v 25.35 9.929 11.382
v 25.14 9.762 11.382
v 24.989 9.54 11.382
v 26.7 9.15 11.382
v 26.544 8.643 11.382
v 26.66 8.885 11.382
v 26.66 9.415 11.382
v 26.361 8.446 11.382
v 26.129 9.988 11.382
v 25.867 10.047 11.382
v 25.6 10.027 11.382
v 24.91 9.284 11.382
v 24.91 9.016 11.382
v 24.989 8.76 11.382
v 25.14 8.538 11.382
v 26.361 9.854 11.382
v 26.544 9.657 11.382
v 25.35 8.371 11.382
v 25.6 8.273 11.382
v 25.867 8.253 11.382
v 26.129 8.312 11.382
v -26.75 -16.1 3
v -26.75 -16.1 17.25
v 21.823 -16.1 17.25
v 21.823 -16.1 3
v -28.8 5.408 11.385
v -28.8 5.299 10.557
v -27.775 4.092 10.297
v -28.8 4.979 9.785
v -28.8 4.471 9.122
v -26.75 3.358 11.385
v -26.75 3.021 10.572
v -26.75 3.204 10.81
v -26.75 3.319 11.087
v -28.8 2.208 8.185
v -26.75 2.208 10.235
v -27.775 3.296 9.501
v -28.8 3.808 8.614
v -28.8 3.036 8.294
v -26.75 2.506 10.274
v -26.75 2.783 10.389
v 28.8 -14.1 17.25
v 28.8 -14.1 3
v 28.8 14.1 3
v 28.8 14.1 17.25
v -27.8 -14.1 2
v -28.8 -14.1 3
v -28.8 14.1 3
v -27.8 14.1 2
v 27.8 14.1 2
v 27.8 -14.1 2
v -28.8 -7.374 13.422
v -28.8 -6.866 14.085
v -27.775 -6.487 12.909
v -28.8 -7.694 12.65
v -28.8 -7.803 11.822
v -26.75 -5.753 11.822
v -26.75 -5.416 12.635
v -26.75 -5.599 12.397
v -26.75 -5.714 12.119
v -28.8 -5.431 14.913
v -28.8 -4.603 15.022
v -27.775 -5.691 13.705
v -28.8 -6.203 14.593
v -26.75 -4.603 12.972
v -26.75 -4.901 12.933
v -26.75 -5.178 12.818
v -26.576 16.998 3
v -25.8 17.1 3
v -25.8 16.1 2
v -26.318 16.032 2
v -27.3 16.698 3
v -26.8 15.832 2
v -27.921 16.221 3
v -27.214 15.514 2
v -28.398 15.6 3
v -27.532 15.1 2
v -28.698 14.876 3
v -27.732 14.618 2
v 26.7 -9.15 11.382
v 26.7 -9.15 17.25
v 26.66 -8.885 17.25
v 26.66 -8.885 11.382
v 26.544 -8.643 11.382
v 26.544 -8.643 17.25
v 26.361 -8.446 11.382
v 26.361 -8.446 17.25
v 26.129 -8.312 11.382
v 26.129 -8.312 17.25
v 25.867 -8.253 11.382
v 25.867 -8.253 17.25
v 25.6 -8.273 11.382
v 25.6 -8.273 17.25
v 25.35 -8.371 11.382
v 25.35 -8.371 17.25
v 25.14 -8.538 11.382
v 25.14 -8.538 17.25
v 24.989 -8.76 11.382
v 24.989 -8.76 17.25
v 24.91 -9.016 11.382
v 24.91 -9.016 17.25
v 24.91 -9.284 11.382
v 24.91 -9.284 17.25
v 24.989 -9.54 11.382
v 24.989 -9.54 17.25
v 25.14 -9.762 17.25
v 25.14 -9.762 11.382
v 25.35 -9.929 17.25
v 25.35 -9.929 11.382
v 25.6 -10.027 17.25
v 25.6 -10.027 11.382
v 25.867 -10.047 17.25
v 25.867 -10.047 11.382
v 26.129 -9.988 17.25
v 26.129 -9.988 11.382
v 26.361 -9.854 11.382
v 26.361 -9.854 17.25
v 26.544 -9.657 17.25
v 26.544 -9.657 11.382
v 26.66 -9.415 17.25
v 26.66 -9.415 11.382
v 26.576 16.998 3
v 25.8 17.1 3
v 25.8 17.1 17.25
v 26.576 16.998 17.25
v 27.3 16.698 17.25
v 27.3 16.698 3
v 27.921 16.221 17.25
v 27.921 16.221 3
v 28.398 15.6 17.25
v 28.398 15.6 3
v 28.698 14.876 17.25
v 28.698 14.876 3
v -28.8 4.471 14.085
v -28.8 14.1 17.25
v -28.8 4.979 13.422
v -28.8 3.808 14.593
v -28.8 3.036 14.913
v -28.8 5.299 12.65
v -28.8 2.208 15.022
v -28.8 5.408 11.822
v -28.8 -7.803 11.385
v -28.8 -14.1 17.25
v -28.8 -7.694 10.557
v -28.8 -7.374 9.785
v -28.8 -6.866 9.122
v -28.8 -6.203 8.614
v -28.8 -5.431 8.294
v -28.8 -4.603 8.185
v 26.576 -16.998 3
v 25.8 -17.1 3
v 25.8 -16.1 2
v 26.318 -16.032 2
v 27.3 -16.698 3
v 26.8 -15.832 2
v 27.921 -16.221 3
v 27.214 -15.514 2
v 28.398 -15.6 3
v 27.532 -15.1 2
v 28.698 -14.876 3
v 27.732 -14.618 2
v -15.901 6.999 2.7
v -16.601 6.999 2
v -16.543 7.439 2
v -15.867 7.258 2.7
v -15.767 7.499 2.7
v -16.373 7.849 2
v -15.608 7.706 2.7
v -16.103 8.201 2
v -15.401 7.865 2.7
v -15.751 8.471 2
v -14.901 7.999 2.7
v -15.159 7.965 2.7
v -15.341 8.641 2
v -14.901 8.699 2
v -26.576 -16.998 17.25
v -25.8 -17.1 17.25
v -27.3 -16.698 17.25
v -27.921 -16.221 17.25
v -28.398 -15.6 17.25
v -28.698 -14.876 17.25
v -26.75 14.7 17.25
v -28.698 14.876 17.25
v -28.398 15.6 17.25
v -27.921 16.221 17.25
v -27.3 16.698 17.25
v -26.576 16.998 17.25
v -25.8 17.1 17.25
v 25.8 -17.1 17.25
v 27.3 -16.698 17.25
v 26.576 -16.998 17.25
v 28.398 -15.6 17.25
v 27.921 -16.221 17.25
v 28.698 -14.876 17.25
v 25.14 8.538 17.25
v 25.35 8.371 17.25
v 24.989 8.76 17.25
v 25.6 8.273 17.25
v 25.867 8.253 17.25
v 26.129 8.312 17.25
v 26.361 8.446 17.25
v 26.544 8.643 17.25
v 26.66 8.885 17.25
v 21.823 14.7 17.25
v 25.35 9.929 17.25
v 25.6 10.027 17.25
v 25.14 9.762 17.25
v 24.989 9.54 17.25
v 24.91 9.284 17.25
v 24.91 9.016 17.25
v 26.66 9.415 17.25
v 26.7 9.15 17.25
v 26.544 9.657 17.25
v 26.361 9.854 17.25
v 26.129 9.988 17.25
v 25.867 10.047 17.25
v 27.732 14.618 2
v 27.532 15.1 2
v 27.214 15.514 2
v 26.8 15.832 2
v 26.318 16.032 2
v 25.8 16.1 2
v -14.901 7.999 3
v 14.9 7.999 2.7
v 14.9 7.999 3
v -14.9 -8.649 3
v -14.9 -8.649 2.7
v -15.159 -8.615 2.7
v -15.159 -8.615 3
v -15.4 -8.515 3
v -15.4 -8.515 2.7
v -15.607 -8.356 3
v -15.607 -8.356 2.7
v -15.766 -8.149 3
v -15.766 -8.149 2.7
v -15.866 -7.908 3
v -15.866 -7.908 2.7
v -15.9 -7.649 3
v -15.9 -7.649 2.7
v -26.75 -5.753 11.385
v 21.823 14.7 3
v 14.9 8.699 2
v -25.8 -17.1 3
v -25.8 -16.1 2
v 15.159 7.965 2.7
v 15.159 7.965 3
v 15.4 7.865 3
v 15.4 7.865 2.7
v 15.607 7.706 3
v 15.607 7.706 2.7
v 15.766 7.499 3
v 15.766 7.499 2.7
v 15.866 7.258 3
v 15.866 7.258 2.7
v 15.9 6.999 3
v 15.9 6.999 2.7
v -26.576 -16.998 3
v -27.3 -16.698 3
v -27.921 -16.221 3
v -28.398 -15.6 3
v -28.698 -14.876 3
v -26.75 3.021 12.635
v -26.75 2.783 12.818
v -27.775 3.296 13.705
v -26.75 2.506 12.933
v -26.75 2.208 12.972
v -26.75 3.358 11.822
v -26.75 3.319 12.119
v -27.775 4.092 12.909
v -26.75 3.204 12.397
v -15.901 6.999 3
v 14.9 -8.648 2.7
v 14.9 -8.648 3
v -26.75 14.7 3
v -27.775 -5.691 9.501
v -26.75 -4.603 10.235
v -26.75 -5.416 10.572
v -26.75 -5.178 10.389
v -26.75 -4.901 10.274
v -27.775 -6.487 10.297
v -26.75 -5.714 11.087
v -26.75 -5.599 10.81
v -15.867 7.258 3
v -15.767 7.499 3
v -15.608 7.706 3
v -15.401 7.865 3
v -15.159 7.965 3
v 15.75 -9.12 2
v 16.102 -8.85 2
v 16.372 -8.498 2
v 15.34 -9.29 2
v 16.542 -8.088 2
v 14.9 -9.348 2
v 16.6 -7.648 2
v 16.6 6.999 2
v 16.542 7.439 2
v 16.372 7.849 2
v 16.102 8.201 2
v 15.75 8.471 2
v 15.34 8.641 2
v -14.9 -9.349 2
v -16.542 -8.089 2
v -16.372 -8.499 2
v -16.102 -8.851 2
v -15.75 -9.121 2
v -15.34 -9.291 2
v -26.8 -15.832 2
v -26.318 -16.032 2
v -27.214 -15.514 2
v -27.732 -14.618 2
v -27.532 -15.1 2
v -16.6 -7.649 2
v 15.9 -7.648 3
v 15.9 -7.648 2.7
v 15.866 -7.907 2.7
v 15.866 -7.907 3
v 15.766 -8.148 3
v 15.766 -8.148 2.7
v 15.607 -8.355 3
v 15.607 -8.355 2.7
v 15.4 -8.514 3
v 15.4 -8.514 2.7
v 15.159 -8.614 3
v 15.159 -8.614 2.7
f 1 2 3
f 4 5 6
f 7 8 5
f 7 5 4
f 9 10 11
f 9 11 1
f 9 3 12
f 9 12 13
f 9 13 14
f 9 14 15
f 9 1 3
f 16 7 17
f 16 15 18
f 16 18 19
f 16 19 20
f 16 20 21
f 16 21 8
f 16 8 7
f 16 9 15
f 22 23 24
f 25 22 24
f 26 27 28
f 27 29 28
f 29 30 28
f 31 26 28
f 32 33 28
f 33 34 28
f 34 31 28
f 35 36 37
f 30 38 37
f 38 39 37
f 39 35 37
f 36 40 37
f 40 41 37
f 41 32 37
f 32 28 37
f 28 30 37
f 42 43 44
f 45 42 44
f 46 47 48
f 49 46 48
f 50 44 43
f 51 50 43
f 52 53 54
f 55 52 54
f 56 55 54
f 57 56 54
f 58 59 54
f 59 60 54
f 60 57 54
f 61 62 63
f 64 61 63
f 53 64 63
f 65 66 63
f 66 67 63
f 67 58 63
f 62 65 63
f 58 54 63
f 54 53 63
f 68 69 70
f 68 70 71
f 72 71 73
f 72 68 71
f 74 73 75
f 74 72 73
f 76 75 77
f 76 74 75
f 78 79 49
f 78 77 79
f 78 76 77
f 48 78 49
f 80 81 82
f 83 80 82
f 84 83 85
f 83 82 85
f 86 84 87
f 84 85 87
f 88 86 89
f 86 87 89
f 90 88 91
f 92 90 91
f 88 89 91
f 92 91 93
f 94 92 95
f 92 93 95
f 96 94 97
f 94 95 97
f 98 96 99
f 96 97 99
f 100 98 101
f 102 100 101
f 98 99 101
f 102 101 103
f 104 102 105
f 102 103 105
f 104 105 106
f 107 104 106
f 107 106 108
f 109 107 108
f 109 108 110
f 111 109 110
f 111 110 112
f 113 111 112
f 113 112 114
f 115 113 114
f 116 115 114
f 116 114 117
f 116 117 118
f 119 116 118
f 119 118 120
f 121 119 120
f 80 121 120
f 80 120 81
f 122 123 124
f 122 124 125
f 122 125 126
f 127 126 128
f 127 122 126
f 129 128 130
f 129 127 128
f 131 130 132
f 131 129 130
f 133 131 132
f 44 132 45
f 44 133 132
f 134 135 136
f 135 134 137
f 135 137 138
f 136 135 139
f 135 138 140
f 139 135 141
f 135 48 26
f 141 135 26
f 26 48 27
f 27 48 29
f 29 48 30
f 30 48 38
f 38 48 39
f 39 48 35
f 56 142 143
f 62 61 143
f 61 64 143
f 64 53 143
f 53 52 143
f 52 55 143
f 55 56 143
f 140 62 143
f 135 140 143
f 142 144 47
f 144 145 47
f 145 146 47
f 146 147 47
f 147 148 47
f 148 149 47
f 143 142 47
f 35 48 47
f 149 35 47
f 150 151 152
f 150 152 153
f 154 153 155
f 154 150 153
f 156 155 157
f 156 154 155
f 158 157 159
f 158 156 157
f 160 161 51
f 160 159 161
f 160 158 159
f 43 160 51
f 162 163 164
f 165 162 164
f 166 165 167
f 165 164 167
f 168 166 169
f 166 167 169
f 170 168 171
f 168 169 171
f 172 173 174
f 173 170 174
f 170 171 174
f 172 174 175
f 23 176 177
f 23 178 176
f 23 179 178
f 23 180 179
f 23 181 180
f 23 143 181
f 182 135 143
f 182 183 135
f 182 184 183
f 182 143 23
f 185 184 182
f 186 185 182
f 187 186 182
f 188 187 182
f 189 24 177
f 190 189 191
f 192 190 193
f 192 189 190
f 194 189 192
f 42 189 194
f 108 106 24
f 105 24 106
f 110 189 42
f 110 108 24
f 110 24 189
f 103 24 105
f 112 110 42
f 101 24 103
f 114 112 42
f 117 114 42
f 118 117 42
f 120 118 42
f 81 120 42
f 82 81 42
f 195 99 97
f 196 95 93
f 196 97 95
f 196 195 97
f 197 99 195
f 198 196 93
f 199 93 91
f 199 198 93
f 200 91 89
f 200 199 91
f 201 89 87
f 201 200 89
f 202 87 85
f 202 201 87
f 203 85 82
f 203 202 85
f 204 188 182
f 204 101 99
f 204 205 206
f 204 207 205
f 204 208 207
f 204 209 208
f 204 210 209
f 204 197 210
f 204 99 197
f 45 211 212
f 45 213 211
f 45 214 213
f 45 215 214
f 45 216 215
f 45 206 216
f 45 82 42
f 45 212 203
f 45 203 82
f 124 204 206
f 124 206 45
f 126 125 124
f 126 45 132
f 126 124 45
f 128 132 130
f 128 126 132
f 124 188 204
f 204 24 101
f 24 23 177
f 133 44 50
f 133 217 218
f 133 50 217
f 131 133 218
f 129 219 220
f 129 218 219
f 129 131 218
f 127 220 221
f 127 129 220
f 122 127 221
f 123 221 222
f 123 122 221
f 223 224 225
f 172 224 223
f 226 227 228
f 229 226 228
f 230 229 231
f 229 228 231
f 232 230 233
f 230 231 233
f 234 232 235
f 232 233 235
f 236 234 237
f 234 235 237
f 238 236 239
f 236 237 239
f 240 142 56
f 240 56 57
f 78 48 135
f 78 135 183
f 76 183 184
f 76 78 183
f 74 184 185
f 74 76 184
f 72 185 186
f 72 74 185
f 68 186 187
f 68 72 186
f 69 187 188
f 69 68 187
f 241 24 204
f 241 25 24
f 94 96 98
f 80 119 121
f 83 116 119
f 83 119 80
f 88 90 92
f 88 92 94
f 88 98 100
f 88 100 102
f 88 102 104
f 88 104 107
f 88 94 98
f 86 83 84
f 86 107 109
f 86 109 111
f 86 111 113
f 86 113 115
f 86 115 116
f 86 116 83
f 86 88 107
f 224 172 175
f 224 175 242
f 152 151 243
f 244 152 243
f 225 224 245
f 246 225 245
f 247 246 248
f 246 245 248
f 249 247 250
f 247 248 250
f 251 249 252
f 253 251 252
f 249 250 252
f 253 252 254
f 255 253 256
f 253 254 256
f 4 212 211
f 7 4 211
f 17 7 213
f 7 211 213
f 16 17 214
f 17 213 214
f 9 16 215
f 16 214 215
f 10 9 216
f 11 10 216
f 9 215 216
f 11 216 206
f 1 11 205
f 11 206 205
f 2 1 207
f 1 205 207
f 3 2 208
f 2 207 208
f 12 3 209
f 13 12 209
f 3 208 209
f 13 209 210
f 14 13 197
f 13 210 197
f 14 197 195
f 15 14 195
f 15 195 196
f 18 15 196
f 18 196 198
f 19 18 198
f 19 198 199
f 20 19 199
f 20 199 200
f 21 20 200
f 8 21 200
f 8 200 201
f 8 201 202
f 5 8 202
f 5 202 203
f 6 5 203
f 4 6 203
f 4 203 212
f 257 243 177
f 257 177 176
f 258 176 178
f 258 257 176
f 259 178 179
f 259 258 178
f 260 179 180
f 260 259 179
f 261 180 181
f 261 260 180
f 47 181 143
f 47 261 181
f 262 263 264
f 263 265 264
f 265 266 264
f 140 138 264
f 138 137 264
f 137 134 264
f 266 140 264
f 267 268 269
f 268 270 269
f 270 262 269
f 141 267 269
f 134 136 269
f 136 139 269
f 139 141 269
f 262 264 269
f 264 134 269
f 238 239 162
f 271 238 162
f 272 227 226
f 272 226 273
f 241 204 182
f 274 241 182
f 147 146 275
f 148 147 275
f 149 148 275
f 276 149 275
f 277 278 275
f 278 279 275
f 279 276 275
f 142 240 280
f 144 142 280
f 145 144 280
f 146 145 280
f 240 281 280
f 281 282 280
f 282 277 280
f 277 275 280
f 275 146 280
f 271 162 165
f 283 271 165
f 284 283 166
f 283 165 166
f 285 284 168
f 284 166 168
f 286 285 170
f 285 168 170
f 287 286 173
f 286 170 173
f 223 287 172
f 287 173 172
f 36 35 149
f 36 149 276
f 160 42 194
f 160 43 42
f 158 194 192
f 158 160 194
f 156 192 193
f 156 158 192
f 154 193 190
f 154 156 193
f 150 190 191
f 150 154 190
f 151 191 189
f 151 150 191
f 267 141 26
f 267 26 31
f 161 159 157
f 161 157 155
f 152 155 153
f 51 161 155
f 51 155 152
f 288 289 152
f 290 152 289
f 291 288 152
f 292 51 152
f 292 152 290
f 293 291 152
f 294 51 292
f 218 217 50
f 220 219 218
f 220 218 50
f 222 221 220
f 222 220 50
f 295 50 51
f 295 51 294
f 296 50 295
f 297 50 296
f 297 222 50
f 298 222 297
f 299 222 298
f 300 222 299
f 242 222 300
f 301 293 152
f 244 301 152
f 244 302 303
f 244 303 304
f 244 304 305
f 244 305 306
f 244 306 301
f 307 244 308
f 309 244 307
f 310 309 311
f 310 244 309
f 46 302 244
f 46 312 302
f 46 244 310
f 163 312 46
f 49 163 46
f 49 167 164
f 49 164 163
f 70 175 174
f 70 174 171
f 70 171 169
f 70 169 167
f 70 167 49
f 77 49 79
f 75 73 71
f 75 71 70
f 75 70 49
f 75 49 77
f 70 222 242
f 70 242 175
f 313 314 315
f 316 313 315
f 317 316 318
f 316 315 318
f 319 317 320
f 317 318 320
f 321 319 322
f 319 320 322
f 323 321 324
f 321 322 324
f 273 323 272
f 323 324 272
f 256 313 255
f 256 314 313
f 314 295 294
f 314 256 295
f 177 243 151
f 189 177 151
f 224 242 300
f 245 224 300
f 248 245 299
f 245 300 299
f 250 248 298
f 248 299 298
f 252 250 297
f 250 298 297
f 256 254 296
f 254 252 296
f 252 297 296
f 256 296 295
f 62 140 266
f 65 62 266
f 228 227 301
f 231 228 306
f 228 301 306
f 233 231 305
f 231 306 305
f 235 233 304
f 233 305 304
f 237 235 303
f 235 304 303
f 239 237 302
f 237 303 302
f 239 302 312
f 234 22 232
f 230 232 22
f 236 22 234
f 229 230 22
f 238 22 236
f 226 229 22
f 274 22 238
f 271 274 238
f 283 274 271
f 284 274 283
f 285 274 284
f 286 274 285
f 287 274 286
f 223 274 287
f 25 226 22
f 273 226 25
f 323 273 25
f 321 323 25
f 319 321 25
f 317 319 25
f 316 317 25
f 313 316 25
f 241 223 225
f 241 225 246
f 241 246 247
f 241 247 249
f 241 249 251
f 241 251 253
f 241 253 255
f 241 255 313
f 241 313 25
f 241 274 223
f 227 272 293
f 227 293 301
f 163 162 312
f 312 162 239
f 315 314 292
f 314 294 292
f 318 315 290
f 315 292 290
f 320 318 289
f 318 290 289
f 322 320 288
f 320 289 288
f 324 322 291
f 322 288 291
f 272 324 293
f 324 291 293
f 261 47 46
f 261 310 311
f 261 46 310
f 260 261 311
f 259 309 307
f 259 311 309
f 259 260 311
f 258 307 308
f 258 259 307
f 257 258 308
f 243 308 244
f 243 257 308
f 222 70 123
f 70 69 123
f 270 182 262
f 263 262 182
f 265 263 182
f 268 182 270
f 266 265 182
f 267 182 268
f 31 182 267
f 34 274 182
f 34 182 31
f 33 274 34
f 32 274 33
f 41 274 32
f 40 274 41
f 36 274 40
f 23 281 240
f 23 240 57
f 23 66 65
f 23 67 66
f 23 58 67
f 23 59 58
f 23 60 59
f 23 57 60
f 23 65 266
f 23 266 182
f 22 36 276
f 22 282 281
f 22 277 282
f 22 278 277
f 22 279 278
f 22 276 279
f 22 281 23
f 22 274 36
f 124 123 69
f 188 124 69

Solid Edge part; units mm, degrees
sketch "Sketch1" plane through (0, 0, 0) normal (0, 0, 1) x (1, 0, 0)
  line L0 (-26.75, -15.6) -> (26.75, -15.6)
  line L1 (26.75, -15.6) -> (26.75, 15.6)
  line L2 (26.75, 15.6) -> (-26.75, 15.6)
  line L3 (-26.75, 15.6) -> (-26.75, -15.6)
extrude "Protrusion1" add sketch "Sketch1" along normal blind 3
sketch "Sketch2" plane through (0, 0, 0) normal (0, 0, 1) x (1, 0, 0)
  line L0 (-26.75, -15.6) -> (26.75, -15.6)
  line L1 (26.75, -15.6) -> (26.75, 15.6)
  line L2 (26.75, 15.6) -> (-26.75, 15.6)
  line L3 (-26.75, 15.6) -> (-26.75, -15.6)
  line L4 (-25.8, -17.1) -> (25.8, -17.1)
  arc A0 (28.8, -14.1) -> (25.8, -17.1) centre (25.8, -14.1) cw
  line L5 (28.8, -14.1) -> (28.8, 14.1)
  arc A1 (25.8, 17.1) -> (28.8, 14.1) centre (25.8, 14.1) cw
  line L6 (25.8, 17.1) -> (-25.8, 17.1)
  arc A2 (-28.8, 14.1) -> (-25.8, 17.1) centre (-25.8, 14.1) cw
  line L7 (-28.8, 14.1) -> (-28.8, -14.1)
  arc A3 (-28.8, -14.1) -> (-25.8, -17.1) centre (-25.8, -14.1) ccw
extrude "Wyciągnięcie_2" add sketch "Sketch2" along normal blind 15
chamfer "Faza_4" distance 1 angle 45 8 edges at (28.8, 0, 0) (27.9213, 16.2213, 0) (0, 17.1, 0) (-27.9213, 16.2213, 0) (-28.8, 0, 0) (-27.9213, -16.2213, 0) (0, -17.1, 0) (27.9213, -16.2213, 0)
sketch "Sketch3" plane through (0, 0, 3) normal (0, 0, 1) x (1, 0, 0)
  line L0 (26.75, 15.6) -> (22.07, 15.6)
  line L1 (22.07, 15.6) -> (22.07, -15.6)
  line L2 (22.07, -15.6) -> (26.75, -15.6)
  line L3 (26.75, -15.6) -> (26.75, 15.6)
extrude "Wycięcie_2" add sketch "Sketch3" along normal blind 12
sketch "Sketch4" plane through (-28.8, 0, 8) normal (-1, 0, 0) x (0, -1, 0)
  line L0 (-2.208, 2.2848) -> (4.6031, 2.2848)
  arc A0 (5.7031, 3.3848) -> (4.6031, 2.2848) centre (4.6031, 3.3848) cw
  line L1 (5.7031, 3.3848) -> (5.7031, 3.8218)
  arc A1 (4.6031, 4.9218) -> (5.7031, 3.8218) centre (4.6031, 3.8218) cw
  line L2 (4.6031, 4.9218) -> (-2.208, 4.9218)
  arc A2 (-2.208, 4.9218) -> (-3.308, 3.8218) centre (-2.208, 3.8218) ccw
  line L3 (-3.308, 3.8218) -> (-3.308, 3.3848)
  arc A3 (-3.308, 3.3848) -> (-2.208, 2.2848) centre (-2.208, 3.3848) ccw
  dimension "D1" = 1.1
  dimension "D2" = 1.1
  dimension "D3" = 1.1
  dimension "D4" = 1.1
  dimension "D5" = 0.4371
extrude "Wycięcie_3" cut sketch "Sketch4" against normal blind 11.9554
sketch "Sketch5" plane through (-2.34, 0, 3) normal (0, 0, 1) x (1, 0, 0)
  line L0 (-24.41, 15.6) -> (-24.41, 15.2)
  line L1 (-24.41, 15.2) -> (24.41, 15.2)
  line L2 (24.41, 15.2) -> (24.41, 15.6)
  line L3 (24.41, 15.6) -> (-24.41, 15.6)
extrude "Wyciągnięcie_4" add sketch "Sketch5" along normal blind 12
sketch "Sketch6" plane through (-0.1019, 0, 15) normal (0, 0, 1) x (1, 0, 0)
  line L0 (-25.6981, -17.1) -> (25.9019, -17.1)
  arc A0 (25.9019, -17.1) -> (28.9019, -14.1) centre (25.9019, -14.1) ccw
  line L1 (28.9019, -14.1) -> (28.9019, 14.1)
  arc A1 (25.9019, 17.1) -> (28.9019, 14.1) centre (25.9019, 14.1) cw
  line L2 (25.9019, 17.1) -> (-25.6981, 17.1)
  arc A2 (-28.6981, 14.1) -> (-25.6981, 17.1) centre (-25.6981, 14.1) cw
  line L3 (-28.6981, 14.1) -> (-28.6981, -14.1)
  arc A3 (-28.6981, -14.1) -> (-25.6981, -17.1) centre (-25.6981, -14.1) ccw
  line L4 (-26.6481, 15.2) -> (22.1719, 15.2)
  line L5 (22.1719, 15.2) -> (22.1719, -15.6)
  line L6 (22.1719, -15.6) -> (-26.6481, -15.6)
  line L7 (-26.6481, -15.6) -> (-26.6481, 15.2)
extrude "Wyciągnięcie_5" add sketch "Sketch6" along normal blind 3
sketch "Sketch7" plane through (0, 0, 18) normal (0, 0, 1) x (1, 0, 0)
  line L0 (-26.75, -15.6) -> (-26.75, -16.1)
  line L1 (-26.75, -16.1) -> (22.0731, -16.1)
  line L2 (22.0731, -16.1) -> (22.07, -15.6)
  line L3 (22.07, -15.6) -> (-26.75, -15.6)
extrude "Wycięcie_6" cut sketch "Sketch7" against normal blind 15
sketch "Sketch8" plane through (0, 0, 18) normal (0, 0, 1) x (1, 0, 0)
  circle A0 centre (25.8, 9.15) radius 0.9
  circle A1 centre (25.8, -9.15) radius 0.9
extrude "Wycięcie_7" cut sketch "Sketch8" against normal blind 6.6184
sketch "Sketch9" plane through (-2.3384, -0.45, 3) normal (0, 0, 1) x (-1, 0, 0)
  line L0 (-24.4116, 15.65) -> (-24.1616, 15.65)
  line L1 (-24.1616, 15.65) -> (-24.1616, -15.65)
  line L2 (-24.1616, -15.65) -> (-24.4084, -15.65)
  line L3 (-24.4084, -15.65) -> (-24.4116, 15.65)
  dimension "D1" = 0.25
extrude "Wyciągnięcie_6" add sketch "Sketch9" along normal blind 15
sketch "Sketch10" plane through (0, 0, 18) normal (0, 0, 1) x (-1, 0, 0)
  line L0 (-38.4633, -19.2005) -> (38.4633, -19.2005)
  line L1 (38.4633, -19.2005) -> (38.4633, 19.2005)
  line L2 (38.4633, 19.2005) -> (-38.4633, 19.2005)
  line L3 (-38.4633, 19.2005) -> (-38.4633, -19.2005)
extrude "Wycięcie_9" cut sketch "Sketch10" against normal blind 0.75
sketch "Sketch11" plane through (0, 0, 0) normal (0, 0, -1) x (1, 0, 0)
  line L0 (-34.3065, -19.3102) -> (34.3065, -19.3102)
  line L1 (34.3065, -19.3102) -> (34.3065, 19.3102)
  line L2 (34.3065, 19.3102) -> (-34.3065, 19.3102)
  line L3 (-34.3065, 19.3102) -> (-34.3065, -19.3102)
  dimension "D1" = 68.6129
  dimension "D2" = 38.6204
extrude "Wycięcie_10" cut sketch "Sketch11" against normal blind 2
chamfer "Faza_13" distance 1 angle 45 8 edges at (-28.8, 0, 2) (-27.9213, 16.2213, 2) (0, 17.1, 2) (27.9213, 16.2213, 2) (28.8, 0, 2) (27.9213, -16.2213, 2) (0, -17.1, 2) (-27.9213, -16.2213, 2)
sketch "Sketch12" plane through (0, 0, 17.25) normal (0, 0, 1) x (-1, 0, 0)
  line L0 (-21.8231, -15.2) -> (-21.8231, -14.7)
  line L1 (-21.8231, -14.7) -> (26.75, -14.7)
  line L2 (26.75, -14.7) -> (26.75, -15.2)
  line L3 (26.75, -15.2) -> (-21.8231, -15.2)
  dimension "D1" = 0.5
extrude "Protrusion2" add sketch "Sketch12" against normal up to vertex (14.25 mm away)
sketch "Sketch13" plane through (0, 0, 2) normal (0, 0, -1) x (1, 0, 0)
  line L0 (-14.9, 8.6489) -> (14.9, 8.6478)
  arc A0 (14.9, 8.6478) -> (15.9, 7.6478) centre (14.9, 7.6478) cw
  line L1 (15.9, 7.6478) -> (15.9, -6.9988)
  arc A1 (14.9, -7.9988) -> (15.9, -6.9988) centre (14.9, -6.9988) ccw
  line L2 (14.9, -7.9988) -> (-14.9006, -7.9988)
  arc A2 (-15.9006, -6.9988) -> (-14.9006, -7.9988) centre (-14.9006, -6.9988) ccw
  line L3 (-15.9, 7.649) -> (-15.9006, -6.9988)
  arc A3 (-15.9, 7.649) -> (-14.9, 8.6489) centre (-14.9, 7.6489) cw
  dimension "D1" = 14.6477
  dimension "D2" = 14.6466
  dimension "D3" = 29.8006
  dimension "D4" = 1
  dimension "D5" = 1
  dimension "D6" = 1
  dimension "D7" = 1
extrude "Wyciągnięcie_8" cut sketch "Sketch13" against normal blind 166.3187
chamfer "Faza_16" distance 2.1 angle 45 8 edges at (-28.8, -1.1976, 10.2848) (-28.8, -5.381, 10.6069) (-28.8, -5.7031, 11.6033) (-28.8, -5.381, 12.5996) (-28.8, -1.1976, 12.9218) (-28.8, 2.9858, 12.5996) (-28.8, 3.308, 11.6033) (-28.8, 2.9858, 10.6069)
chamfer "Faza_17" distance 0.7 angle 45 8 edges at (-0.0003, 7.9988, 2) (-15.6077, 7.7059, 2) (-15.9003, -0.3251, 2) (-15.6071, -8.3561, 2) (0, -8.6484, 2) (15.6071, -8.3549, 2) (15.9, -0.3245, 2) (15.6071, 7.7059, 2)
